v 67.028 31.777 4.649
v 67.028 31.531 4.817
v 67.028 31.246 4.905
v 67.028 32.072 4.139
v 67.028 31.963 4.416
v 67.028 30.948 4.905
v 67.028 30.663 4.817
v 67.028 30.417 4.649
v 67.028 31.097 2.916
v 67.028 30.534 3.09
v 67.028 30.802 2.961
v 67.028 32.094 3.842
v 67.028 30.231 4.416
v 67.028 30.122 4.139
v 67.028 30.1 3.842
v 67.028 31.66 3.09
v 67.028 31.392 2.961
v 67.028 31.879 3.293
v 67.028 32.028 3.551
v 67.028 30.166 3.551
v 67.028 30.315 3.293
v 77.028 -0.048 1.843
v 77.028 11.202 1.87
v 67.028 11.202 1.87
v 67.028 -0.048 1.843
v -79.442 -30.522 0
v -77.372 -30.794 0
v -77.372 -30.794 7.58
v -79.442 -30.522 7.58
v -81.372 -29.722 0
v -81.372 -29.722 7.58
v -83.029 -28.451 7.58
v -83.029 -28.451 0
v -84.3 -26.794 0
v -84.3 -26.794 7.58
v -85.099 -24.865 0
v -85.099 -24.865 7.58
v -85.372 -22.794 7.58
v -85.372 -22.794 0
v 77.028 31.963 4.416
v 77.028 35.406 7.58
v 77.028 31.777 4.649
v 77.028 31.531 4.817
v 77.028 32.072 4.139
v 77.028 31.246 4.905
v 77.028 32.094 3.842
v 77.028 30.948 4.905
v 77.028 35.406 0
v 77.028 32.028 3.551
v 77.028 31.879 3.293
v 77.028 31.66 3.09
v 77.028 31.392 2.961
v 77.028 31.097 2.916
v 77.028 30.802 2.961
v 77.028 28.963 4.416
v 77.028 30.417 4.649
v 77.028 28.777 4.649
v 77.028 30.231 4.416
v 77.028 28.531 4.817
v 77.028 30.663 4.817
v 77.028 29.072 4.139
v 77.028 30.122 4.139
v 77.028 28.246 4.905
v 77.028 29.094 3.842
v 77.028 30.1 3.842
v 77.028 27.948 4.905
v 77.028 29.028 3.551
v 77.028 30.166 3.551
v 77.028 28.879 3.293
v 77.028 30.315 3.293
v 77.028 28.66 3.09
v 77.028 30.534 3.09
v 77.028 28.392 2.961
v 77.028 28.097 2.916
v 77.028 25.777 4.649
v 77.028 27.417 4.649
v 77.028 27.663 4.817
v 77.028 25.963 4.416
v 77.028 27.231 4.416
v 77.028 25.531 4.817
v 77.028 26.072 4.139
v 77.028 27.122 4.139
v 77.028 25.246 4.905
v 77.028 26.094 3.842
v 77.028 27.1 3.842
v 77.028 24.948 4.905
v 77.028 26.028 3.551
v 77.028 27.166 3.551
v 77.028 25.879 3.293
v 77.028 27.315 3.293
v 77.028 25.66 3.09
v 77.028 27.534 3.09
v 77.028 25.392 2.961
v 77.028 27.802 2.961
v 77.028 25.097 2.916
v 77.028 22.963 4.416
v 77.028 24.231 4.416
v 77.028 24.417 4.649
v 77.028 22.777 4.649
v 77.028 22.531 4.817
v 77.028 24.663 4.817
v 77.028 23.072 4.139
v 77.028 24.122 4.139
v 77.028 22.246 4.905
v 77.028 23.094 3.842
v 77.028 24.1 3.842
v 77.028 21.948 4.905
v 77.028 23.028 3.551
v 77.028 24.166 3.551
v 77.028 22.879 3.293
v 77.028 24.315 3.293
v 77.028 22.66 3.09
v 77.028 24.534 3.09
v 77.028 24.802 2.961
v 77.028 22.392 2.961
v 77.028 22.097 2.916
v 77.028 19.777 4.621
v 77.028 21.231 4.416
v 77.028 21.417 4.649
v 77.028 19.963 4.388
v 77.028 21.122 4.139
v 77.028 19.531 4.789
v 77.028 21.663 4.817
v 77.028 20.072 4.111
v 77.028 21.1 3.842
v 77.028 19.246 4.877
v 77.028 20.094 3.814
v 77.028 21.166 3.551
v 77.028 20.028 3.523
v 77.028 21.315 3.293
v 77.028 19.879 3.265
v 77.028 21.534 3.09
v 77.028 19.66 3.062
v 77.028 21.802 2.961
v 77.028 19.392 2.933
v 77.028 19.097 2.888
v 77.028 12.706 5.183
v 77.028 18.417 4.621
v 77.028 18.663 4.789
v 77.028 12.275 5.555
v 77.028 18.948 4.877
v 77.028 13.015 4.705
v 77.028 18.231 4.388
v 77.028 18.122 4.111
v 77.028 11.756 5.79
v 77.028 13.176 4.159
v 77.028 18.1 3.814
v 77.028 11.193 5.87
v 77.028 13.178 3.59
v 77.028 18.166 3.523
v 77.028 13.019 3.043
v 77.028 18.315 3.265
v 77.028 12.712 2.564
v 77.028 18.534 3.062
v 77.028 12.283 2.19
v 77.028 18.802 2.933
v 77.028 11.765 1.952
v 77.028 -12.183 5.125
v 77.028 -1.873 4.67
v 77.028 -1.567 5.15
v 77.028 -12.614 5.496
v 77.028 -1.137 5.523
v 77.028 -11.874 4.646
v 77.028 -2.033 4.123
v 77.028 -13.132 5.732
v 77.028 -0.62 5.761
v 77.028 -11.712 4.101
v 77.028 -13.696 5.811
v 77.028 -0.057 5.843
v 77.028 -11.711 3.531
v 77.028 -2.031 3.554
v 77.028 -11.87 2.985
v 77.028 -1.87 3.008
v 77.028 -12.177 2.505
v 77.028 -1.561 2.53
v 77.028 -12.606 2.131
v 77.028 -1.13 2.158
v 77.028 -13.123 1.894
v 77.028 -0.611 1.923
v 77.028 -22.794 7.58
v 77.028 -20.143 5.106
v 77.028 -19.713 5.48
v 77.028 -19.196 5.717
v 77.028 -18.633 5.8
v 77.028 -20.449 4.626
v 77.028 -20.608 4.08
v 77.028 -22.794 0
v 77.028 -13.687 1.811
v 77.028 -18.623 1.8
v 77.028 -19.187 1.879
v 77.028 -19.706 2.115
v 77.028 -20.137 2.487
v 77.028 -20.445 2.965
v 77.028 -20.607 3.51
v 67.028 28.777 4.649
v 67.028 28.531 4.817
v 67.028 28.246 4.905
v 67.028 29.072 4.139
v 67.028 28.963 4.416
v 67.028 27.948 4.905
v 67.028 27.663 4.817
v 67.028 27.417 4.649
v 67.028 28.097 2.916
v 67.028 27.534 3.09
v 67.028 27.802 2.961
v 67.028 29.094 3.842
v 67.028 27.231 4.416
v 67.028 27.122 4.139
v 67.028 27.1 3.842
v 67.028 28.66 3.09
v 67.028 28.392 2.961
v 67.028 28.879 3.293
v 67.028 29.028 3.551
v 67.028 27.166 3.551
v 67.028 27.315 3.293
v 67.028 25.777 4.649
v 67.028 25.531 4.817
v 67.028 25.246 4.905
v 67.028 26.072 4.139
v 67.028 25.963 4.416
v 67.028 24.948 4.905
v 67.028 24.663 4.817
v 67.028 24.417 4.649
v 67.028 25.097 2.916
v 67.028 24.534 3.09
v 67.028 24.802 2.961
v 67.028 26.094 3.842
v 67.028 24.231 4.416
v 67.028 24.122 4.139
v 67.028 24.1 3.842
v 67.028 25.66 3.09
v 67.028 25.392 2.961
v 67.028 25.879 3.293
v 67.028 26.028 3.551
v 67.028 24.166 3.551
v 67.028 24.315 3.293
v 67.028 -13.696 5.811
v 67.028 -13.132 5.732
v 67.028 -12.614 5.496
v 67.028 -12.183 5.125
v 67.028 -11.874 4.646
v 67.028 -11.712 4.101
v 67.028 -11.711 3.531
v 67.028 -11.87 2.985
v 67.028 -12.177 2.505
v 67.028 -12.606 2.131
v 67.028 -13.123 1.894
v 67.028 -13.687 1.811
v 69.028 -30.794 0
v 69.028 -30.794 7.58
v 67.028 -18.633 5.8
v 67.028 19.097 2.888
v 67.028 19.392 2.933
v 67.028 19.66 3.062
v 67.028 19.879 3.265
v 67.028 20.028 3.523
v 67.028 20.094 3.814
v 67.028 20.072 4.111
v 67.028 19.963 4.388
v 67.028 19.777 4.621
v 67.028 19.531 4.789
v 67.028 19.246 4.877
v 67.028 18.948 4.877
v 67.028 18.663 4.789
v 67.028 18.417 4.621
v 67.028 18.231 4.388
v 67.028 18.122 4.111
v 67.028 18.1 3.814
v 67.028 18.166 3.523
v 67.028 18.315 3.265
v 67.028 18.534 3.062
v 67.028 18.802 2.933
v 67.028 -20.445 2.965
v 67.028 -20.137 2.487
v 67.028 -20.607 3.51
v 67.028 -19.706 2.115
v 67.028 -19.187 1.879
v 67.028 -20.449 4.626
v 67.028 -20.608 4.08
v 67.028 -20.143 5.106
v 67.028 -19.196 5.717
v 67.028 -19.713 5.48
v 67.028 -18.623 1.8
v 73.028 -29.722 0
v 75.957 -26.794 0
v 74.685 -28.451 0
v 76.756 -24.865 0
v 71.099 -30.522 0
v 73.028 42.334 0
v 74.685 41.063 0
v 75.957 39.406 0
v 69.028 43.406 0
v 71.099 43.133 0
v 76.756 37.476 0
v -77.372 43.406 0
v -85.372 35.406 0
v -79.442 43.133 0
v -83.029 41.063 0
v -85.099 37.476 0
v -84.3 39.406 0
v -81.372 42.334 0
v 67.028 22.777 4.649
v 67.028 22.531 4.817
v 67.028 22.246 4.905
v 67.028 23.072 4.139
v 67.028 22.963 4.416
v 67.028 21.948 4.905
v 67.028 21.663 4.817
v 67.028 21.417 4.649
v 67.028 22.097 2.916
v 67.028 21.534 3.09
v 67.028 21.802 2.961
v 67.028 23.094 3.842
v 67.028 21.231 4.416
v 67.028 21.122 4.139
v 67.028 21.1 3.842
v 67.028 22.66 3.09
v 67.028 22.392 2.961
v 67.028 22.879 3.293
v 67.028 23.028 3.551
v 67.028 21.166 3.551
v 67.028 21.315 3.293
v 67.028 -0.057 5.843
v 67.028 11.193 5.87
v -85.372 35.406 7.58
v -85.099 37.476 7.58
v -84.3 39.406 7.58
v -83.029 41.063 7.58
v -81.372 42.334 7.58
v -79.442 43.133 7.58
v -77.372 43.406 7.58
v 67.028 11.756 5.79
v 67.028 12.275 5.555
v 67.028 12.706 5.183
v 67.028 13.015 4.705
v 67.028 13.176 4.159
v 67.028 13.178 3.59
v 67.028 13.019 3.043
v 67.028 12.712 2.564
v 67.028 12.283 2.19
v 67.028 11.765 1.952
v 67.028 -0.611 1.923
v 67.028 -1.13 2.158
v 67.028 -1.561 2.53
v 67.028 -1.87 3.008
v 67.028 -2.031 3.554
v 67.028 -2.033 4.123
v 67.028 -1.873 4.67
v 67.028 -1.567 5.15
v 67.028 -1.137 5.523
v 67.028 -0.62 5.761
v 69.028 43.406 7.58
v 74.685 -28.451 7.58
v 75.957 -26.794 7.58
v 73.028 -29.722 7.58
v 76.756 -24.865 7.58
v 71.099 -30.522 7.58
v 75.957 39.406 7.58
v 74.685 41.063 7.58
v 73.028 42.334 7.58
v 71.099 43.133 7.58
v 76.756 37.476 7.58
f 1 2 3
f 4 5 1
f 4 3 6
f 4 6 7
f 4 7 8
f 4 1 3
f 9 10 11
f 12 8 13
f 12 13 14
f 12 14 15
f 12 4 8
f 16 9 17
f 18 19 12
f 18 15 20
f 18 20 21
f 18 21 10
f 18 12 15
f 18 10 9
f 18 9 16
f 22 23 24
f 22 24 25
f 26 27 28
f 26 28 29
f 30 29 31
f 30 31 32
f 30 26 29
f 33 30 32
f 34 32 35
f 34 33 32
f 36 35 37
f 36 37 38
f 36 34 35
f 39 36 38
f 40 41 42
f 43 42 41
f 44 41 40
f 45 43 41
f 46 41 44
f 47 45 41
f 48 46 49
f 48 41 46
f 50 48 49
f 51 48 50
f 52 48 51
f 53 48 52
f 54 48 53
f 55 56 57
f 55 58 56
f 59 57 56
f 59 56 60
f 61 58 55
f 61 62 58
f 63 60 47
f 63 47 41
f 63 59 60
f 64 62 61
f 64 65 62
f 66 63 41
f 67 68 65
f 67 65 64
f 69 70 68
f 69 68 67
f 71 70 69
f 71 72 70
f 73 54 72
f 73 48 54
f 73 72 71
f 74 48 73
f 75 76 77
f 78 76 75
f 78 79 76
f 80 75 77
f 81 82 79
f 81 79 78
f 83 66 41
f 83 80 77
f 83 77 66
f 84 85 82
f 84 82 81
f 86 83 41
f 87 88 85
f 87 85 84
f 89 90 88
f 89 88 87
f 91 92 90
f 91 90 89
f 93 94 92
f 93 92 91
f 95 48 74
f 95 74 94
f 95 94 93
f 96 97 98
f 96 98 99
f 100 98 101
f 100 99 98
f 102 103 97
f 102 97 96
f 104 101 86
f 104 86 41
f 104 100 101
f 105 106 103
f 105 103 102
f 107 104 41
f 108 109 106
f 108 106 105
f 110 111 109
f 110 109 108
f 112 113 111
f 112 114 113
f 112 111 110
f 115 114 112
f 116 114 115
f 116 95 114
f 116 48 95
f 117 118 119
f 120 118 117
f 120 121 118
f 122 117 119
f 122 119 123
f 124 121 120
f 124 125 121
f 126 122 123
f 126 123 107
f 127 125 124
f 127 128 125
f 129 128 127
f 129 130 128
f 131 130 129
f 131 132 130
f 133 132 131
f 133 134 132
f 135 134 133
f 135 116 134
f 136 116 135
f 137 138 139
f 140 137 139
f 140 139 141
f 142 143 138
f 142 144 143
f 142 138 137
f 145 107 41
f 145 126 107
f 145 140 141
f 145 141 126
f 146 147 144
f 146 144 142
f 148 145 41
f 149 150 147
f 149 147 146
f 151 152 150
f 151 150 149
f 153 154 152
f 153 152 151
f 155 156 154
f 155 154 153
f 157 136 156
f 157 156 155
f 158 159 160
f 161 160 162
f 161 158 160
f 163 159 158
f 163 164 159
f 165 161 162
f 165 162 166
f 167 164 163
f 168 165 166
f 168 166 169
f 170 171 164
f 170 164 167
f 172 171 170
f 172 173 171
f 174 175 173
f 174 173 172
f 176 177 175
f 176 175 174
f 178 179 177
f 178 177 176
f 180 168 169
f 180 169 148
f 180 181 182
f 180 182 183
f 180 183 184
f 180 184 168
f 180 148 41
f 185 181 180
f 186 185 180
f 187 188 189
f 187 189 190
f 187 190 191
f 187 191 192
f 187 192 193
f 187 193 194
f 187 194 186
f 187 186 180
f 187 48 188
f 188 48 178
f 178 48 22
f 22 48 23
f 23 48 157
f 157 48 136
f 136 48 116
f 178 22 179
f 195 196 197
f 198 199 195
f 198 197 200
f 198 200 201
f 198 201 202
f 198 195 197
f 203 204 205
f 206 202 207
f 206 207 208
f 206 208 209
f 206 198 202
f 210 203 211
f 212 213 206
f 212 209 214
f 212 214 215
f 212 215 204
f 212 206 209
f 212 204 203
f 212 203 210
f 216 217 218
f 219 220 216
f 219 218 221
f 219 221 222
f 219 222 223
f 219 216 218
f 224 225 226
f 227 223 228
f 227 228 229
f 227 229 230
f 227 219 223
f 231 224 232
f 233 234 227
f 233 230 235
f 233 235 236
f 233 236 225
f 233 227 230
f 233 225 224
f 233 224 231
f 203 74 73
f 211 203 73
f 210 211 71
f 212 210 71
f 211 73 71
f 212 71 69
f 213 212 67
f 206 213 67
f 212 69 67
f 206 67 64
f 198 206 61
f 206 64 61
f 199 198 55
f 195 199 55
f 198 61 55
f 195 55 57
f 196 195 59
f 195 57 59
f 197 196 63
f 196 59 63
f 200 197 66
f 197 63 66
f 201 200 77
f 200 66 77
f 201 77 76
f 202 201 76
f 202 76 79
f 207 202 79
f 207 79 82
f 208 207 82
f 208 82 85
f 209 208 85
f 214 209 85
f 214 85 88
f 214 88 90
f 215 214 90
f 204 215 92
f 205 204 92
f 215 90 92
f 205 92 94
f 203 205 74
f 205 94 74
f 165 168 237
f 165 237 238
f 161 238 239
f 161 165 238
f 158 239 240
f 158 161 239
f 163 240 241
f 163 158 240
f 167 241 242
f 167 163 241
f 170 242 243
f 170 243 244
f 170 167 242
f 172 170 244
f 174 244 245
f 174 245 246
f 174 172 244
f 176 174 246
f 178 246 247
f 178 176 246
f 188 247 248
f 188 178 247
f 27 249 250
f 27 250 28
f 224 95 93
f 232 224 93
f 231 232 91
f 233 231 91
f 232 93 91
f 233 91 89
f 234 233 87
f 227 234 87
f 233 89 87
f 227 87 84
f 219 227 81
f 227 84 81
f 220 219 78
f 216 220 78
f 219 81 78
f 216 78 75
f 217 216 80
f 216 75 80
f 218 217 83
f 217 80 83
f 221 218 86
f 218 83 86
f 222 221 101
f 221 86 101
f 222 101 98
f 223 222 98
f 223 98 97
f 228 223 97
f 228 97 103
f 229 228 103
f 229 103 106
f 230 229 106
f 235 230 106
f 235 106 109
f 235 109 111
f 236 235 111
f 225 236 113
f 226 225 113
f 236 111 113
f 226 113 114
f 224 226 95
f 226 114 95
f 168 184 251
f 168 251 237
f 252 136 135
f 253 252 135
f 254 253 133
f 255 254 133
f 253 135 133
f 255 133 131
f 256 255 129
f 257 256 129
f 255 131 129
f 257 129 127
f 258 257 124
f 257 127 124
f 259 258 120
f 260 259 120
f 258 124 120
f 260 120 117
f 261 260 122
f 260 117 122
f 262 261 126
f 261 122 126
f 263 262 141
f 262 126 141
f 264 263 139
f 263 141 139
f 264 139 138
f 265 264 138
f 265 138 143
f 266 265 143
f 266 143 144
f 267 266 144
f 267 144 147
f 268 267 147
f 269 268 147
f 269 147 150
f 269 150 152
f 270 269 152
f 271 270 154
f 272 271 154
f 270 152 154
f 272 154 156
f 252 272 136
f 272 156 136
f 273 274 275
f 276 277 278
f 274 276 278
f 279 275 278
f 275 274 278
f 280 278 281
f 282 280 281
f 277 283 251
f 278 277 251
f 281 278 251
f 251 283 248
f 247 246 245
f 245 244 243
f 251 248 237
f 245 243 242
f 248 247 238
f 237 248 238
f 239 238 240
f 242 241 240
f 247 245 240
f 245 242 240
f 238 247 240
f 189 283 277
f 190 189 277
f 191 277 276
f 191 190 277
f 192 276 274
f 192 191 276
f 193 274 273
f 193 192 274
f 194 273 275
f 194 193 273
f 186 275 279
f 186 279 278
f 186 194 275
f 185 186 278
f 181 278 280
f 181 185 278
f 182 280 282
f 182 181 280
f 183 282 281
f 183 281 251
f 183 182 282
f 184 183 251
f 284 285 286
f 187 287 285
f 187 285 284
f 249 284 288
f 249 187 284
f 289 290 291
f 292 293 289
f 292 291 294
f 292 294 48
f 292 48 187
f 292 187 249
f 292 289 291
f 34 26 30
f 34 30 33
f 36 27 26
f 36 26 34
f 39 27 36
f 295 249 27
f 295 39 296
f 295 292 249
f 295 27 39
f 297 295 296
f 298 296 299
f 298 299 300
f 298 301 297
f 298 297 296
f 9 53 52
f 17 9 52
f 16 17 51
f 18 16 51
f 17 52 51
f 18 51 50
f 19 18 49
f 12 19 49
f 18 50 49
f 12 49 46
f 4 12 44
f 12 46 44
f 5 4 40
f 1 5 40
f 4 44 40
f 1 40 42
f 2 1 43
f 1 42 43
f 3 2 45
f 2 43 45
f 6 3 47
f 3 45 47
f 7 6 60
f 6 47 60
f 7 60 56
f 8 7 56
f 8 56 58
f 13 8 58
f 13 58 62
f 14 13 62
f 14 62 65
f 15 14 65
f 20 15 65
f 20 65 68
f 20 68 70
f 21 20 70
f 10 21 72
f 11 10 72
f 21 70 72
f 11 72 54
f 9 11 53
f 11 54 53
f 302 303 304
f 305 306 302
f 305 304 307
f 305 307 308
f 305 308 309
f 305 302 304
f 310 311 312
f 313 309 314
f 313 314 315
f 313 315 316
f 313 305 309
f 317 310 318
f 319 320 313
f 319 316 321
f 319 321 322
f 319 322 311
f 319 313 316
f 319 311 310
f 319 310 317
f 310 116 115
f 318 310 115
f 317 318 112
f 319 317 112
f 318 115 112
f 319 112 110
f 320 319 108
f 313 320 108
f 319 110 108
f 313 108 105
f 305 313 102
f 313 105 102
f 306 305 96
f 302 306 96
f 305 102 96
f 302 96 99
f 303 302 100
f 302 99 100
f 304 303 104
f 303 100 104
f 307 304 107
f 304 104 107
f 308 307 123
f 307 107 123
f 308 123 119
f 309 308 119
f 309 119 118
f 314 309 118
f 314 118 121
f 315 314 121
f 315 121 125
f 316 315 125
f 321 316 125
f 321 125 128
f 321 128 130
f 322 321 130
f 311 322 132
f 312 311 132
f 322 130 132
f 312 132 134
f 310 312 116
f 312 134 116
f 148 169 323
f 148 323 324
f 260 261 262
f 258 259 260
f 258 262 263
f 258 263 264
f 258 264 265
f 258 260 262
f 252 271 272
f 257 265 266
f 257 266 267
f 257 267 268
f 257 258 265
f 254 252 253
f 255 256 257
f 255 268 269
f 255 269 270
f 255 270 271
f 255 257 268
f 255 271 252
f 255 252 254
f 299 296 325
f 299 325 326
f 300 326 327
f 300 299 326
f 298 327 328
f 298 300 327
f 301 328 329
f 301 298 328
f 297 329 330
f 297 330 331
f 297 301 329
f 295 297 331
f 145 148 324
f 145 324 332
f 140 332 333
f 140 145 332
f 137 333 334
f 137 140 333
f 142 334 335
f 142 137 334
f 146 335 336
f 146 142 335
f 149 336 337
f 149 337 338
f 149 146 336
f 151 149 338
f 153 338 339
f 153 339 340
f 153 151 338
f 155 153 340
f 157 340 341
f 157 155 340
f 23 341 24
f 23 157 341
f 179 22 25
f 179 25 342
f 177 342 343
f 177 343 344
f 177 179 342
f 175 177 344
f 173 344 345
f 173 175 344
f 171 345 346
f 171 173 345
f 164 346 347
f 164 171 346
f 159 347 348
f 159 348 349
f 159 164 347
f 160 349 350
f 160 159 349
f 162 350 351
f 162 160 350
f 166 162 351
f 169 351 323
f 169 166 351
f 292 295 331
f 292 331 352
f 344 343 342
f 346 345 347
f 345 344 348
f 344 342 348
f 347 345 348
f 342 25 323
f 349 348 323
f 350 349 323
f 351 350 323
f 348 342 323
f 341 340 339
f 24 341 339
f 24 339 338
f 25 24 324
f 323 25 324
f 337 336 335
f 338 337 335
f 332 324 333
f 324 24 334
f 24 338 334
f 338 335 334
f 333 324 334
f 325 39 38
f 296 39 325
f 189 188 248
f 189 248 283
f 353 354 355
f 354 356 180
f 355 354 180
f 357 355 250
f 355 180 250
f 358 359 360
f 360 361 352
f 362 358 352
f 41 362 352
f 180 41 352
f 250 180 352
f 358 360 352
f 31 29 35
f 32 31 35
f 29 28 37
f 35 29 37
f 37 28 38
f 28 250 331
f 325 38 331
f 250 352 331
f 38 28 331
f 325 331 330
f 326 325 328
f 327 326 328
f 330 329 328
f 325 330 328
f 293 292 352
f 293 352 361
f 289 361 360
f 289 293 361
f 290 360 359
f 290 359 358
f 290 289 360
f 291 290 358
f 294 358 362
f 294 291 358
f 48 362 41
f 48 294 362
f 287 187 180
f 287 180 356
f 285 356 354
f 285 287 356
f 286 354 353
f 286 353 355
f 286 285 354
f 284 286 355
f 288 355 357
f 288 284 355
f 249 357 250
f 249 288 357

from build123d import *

# Parameters (mm, degrees)
EXTRUDE_1_DEPTH     = 7.58
SKETCH_2_R          = 1
CUT_EXTRUDE_1_DEPTH = 10


with BuildPart() as part:
    # 草图1 → 凸台-拉伸1 (new body)
    with BuildSketch(Plane.XY):
        with BuildLine():
            Line((-77.371685393, 43.405828583), (69.028314607, 43.405828583))
            ThreePointArc((69.028314607, 43.405828583), (74.685168856, 41.062682833), (77.028314607, 35.405828583))
            Line((77.028314607, 35.405828583), (77.028314607, -22.794171417))
            ThreePointArc((77.028314607, -22.794171417), (74.685168856, -28.451025666), (69.028314607, -30.794171417))
            Line((69.028314607, -30.794171417), (-77.371685393, -30.794171417))
            ThreePointArc((-77.371685393, -30.794171417), (-83.028539643, -28.451025666), (-85.371685393, -22.794171417))
            Line((-85.371685393, -22.794171417), (-85.371685393, 35.405828583))
            ThreePointArc((-85.371685393, 35.405828583), (-83.028539643, 41.062682833), (-77.371685393, 43.405828583))
        make_face()
    extrude(amount=EXTRUDE_1_DEPTH)

    # 草图2 → 切除-拉伸1 (cut)
    with BuildSketch(Plane(origin=(77.028314607, 0, 0), x_dir=(0, 0, -1), z_dir=(1, 0, 0))):
        with Locations((-3.91637094, 31.096940443)):
            Circle(SKETCH_2_R)
        with Locations((-3.91637094, 28.096940443)):
            Circle(SKETCH_2_R)
        with Locations((-3.91637094, 25.096940443)):
            Circle(SKETCH_2_R)
        with Locations((-3.91637094, 22.096940443)):
            Circle(SKETCH_2_R)
        with Locations((-3.888231768, 19.096940443)):
            Circle(SKETCH_2_R)
        with BuildLine():
            Line((-1.869713351, 11.20207357), (-1.843333719, -0.047567419))
            ThreePointArc((-1.843333719, -0.047567419), (-3.838638371, -2.05225177), (-5.843322722, -0.056947118))
            Line((-5.843322722, -0.056947118), (-5.869702354, 11.192693871))
            ThreePointArc((-5.869702354, 11.192693871), (-3.874397702, 13.197378222), (-1.869713351, 11.20207357))
        make_face()
        with BuildLine():
            Line((-1.811351016, -13.686647662), (-1.799774442, -18.623498185))
            ThreePointArc((-1.799774442, -18.623498185), (-3.795079095, -20.628182535), (-5.799763445, -18.632877883))
            Line((-5.799763445, -18.632877883), (-5.811340019, -13.69602736))
            ThreePointArc((-5.811340019, -13.69602736), (-3.816035367, -11.69134301), (-1.811351016, -13.686647662))
        make_face()
    extrude(amount=-CUT_EXTRUDE_1_DEPTH, mode=Mode.SUBTRACT)


solid = part.part
